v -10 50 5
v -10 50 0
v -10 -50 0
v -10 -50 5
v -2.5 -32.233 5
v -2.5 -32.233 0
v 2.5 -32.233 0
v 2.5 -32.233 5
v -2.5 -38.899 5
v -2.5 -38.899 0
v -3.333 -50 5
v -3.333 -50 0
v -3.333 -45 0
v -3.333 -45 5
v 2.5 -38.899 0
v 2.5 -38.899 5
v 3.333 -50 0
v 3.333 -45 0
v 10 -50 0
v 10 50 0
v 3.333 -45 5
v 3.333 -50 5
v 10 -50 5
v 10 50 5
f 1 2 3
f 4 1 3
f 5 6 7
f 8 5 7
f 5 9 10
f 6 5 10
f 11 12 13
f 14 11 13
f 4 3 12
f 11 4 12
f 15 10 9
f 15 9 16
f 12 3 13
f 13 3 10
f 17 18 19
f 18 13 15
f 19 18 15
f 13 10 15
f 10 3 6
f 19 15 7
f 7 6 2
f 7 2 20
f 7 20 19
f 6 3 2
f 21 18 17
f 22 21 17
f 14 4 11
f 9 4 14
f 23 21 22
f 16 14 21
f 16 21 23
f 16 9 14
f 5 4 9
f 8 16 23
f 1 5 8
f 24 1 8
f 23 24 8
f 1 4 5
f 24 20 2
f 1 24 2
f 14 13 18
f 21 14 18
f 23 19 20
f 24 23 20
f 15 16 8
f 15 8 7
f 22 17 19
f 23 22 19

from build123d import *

# Parameters (mm, degrees)
BOSS_EXTRUDE1_DEPTH = 5
CAVITY1_START       = -38.899371069
CAVITY1_OUTLINE_W   = 5
CAVITY1_OUTLINE_H   = 5
CAVITY1_DEPTH       = 6.666666666


# Read off the part's stored shape, not the designer's step: Cavity1
with BuildPart() as part:
    # Sketch1 → Boss-Extrude1 (new body)
    with BuildSketch(Plane.XY):
        Polygon((3.333333333, -50), (10, -50), (10, 50), (-10, 50), (-10, -50), (-3.333333333, -50), (-3.333333333, -45), (3.333333333, -45), align=None)
    extrude(amount=BOSS_EXTRUDE1_DEPTH)

    # Cavity1 outline → Cavity1 (cut)
    with BuildSketch(Plane(origin=(0, 0, 0), x_dir=(1, 0, 0), z_dir=(0, 1, 0)).offset(CAVITY1_START)):
        with Locations((0, -2.5)):
            Rectangle(CAVITY1_OUTLINE_W, CAVITY1_OUTLINE_H)
    extrude(amount=CAVITY1_DEPTH, mode=Mode.SUBTRACT)


solid = part.part
